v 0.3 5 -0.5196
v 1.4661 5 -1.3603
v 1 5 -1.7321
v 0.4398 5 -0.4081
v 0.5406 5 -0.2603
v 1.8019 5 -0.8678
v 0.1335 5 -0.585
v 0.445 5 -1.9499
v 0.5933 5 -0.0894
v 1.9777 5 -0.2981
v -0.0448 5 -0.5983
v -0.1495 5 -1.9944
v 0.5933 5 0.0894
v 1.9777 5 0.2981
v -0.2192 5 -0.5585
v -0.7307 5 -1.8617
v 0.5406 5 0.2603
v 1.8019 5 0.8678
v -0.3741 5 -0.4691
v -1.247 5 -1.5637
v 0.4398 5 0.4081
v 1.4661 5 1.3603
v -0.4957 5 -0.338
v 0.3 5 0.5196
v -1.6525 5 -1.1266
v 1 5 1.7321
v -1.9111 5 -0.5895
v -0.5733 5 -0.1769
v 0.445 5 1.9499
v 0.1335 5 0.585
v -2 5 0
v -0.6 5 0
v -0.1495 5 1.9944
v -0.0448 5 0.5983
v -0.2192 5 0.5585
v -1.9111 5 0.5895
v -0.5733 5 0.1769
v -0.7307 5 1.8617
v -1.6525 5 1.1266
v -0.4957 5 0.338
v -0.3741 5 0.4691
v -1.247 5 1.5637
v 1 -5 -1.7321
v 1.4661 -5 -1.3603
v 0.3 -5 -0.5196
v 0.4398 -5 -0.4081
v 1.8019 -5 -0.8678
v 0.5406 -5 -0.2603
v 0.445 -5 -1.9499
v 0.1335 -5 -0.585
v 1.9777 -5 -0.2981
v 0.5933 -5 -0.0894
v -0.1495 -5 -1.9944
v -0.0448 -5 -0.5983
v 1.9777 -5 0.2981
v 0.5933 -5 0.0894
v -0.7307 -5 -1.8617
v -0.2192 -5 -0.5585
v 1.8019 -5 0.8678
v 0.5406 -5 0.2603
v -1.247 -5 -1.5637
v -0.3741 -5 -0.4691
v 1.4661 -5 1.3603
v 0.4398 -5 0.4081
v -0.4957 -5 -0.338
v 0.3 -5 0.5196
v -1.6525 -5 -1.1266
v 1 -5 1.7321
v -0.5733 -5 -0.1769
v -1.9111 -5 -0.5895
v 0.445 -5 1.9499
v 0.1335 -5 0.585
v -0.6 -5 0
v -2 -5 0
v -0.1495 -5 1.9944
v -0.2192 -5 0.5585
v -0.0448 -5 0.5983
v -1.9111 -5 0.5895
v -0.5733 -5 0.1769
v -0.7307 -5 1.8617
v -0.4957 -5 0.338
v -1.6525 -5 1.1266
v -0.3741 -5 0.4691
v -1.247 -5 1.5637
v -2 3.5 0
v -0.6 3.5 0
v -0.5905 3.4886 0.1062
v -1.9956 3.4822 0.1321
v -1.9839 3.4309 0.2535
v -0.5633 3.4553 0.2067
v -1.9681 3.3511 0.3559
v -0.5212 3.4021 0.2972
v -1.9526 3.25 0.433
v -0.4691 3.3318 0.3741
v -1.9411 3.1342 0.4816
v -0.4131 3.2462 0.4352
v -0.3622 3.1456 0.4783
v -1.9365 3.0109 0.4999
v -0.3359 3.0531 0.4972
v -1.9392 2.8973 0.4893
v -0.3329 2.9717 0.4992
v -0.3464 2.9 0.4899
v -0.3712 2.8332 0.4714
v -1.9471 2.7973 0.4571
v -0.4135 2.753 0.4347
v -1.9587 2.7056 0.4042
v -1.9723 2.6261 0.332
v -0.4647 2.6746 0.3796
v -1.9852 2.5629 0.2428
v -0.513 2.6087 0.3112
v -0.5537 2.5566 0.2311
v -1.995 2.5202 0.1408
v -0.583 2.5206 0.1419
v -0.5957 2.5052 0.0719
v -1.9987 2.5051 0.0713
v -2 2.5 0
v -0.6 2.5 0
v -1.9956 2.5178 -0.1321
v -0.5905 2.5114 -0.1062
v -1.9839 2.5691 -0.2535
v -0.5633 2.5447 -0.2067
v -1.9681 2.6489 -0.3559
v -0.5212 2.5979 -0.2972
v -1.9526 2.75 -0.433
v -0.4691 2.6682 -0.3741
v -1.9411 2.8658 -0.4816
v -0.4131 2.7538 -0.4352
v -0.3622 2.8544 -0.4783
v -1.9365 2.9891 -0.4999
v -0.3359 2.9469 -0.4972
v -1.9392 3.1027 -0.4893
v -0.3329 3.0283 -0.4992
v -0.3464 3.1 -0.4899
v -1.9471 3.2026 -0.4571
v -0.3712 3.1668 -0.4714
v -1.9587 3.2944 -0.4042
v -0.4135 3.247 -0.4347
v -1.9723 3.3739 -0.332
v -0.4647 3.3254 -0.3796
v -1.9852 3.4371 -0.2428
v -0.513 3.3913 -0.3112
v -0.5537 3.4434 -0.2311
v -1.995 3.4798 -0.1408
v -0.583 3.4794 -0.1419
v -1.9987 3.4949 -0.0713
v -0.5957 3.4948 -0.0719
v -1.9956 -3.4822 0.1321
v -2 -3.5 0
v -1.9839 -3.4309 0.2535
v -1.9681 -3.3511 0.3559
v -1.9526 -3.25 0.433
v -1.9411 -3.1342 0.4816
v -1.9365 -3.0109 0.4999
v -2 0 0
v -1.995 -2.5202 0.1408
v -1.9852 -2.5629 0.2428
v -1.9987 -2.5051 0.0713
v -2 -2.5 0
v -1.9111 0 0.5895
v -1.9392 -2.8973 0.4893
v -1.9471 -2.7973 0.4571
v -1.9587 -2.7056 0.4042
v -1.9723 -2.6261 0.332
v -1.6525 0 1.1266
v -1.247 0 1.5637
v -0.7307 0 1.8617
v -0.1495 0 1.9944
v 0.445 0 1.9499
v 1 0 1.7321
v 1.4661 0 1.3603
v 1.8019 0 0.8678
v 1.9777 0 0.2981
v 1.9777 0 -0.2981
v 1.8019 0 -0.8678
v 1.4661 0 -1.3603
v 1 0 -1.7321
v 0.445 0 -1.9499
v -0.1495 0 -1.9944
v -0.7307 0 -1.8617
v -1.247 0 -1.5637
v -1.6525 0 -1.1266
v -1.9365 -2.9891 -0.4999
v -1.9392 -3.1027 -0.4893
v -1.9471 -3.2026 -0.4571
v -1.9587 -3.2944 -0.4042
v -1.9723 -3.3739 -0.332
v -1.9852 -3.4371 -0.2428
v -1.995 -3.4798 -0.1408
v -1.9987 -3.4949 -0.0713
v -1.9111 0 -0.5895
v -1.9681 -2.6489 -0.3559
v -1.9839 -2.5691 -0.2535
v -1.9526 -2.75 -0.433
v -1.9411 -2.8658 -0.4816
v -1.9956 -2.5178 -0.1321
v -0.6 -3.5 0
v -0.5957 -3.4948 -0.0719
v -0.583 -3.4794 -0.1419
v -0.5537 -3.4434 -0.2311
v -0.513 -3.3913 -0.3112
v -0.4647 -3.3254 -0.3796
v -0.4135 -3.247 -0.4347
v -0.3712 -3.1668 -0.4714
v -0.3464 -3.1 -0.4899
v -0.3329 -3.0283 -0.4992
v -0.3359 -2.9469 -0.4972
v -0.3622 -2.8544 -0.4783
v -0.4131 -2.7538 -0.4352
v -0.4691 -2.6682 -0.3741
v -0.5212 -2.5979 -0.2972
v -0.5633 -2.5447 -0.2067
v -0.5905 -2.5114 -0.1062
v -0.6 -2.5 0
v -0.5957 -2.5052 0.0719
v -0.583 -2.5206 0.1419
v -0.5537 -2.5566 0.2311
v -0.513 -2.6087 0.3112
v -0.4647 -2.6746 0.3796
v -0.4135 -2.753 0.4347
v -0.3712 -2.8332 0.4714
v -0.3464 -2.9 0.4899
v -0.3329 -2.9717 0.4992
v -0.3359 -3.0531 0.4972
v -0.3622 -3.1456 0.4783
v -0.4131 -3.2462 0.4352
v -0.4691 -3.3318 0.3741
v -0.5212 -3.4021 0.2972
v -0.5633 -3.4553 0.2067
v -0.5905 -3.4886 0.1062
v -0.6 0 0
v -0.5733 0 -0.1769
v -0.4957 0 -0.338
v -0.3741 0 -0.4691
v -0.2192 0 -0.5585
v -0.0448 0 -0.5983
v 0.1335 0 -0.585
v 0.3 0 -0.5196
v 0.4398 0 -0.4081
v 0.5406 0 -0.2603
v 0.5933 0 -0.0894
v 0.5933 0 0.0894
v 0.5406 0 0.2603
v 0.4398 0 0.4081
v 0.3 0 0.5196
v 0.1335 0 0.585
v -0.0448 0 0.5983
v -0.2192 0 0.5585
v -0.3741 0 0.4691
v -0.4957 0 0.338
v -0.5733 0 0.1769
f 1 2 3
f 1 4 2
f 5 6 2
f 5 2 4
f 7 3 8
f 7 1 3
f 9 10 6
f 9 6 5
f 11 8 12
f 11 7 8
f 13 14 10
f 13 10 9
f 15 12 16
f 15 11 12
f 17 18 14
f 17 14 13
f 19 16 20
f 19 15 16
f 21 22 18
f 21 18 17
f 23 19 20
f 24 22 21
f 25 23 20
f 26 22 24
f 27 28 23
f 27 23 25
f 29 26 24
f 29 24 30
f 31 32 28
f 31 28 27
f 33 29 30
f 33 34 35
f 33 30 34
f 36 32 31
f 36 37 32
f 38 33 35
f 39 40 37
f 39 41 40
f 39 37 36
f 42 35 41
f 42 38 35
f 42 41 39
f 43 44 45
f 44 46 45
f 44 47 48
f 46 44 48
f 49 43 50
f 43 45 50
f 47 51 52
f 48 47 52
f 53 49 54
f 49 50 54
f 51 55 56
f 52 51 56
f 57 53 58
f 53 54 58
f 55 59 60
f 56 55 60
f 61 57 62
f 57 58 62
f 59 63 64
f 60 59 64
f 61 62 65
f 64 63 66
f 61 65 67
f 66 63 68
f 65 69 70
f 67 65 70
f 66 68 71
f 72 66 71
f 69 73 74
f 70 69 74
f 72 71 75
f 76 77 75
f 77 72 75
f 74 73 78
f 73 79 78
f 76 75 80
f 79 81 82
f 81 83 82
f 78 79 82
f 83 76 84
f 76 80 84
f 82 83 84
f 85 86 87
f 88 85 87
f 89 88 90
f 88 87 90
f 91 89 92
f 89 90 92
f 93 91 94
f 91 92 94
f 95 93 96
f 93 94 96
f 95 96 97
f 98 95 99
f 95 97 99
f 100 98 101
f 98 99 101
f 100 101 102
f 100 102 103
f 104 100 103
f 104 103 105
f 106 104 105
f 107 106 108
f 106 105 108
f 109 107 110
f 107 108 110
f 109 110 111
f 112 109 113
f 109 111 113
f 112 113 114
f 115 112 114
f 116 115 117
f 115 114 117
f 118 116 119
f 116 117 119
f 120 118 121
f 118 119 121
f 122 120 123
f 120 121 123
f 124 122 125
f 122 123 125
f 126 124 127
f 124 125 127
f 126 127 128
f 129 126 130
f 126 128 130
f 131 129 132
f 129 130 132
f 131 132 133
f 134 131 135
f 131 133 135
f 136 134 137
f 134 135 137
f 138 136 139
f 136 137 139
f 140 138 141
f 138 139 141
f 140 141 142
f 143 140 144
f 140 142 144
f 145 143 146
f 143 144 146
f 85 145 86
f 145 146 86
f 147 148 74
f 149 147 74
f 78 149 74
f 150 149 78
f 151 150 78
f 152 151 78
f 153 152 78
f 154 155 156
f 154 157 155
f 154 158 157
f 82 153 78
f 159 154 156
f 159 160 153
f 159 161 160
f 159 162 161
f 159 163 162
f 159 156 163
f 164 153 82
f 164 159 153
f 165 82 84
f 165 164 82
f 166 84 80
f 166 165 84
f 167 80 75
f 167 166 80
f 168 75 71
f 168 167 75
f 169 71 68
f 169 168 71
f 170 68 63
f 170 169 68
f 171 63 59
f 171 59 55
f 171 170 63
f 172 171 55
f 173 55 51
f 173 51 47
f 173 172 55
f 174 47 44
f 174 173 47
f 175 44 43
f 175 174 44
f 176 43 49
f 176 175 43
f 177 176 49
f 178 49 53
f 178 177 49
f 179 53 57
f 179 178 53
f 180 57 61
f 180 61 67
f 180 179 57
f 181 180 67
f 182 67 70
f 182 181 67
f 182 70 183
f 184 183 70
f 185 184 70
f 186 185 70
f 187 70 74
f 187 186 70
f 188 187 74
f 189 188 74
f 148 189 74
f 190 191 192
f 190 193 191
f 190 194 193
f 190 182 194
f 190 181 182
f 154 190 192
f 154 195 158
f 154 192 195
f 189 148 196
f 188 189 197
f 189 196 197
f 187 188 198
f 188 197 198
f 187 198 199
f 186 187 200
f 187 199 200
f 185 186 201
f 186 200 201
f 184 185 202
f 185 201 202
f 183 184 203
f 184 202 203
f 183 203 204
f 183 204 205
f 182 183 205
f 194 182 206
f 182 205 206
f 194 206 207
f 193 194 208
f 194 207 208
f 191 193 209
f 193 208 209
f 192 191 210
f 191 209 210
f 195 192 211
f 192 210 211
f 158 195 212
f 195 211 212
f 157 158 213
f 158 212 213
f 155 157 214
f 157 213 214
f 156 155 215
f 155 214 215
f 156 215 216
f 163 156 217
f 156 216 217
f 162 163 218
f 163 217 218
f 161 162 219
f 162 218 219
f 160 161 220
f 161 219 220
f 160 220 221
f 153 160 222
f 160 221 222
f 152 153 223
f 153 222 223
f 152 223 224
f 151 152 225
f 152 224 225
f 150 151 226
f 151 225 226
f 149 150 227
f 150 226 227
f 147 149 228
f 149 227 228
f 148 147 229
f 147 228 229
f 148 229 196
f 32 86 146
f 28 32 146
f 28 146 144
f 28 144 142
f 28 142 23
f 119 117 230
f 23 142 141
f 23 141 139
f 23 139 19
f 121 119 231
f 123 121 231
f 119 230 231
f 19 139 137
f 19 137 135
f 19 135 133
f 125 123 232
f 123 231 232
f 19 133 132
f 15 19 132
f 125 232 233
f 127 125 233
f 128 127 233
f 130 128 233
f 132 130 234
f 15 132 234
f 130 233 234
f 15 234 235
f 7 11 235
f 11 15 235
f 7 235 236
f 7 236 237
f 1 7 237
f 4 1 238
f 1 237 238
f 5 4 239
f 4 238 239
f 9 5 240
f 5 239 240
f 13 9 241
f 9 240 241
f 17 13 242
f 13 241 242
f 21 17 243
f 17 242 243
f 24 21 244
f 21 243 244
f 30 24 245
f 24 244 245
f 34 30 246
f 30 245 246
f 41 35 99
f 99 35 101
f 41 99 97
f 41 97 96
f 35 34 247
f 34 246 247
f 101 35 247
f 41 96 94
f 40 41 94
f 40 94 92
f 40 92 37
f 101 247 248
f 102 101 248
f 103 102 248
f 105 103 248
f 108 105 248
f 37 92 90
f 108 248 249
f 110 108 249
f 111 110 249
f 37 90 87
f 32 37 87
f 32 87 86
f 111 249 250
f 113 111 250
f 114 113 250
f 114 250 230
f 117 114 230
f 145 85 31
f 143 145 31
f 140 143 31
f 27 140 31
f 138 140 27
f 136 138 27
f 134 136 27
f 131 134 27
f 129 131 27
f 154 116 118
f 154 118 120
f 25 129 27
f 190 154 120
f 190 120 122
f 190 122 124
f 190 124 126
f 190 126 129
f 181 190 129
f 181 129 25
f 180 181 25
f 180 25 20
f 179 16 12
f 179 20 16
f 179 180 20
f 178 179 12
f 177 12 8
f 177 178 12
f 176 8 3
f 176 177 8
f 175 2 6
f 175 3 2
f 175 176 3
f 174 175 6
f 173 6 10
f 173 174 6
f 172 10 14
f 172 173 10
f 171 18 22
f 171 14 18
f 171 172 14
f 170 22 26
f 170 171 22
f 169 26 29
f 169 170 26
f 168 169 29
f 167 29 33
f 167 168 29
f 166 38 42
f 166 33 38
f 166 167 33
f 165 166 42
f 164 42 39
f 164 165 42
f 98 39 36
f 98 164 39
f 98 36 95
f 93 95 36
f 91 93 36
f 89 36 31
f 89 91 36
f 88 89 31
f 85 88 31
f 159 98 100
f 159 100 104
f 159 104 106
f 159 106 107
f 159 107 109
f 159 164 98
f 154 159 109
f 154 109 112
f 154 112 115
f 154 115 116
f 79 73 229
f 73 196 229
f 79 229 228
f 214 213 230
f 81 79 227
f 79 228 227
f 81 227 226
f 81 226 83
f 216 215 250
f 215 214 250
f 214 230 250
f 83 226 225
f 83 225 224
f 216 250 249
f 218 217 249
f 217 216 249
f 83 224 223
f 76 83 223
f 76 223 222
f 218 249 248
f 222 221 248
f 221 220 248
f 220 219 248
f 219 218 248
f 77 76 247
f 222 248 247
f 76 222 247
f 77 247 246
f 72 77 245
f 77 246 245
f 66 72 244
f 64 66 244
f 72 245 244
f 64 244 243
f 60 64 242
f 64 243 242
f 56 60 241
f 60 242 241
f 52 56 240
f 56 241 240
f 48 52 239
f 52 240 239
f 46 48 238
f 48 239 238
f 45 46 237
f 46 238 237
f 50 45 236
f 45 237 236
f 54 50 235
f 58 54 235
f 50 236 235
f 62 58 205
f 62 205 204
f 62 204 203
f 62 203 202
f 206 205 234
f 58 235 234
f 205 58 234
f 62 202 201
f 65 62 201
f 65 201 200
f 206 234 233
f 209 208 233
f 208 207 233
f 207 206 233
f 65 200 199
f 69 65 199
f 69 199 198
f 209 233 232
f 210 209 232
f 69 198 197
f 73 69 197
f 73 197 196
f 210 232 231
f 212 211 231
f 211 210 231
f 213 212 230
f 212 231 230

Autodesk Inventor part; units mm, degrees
ref_plane "YZ Plane" through (0, 0, 0) normal (1, 0, 0) x (0, 1, 0)
ref_plane "XZ Plane" through (0, 0, 0) normal (0, 1, 0) x (-1, 0, 0)
ref_plane "XY Plane" through (0, 0, 0) normal (0, 0, 1) x (1, 0, 0)
sketch "Sketch1" plane through (0, 0, 0) normal (0, 1, 0) x (-1, 0, 0)
  circle A0 centre (0, 0) radius 0.6
  circle A1 centre (0, 0) radius 2
  dimension "d0" = 4
  dimension "d1" = 1.2
extrude "Extrusion1" add sketch "Sketch1" along normal mid plane 10
sketch "Sketch2" plane through (0, 0, 0) normal (1, 0, 0) x (0, 1, 0)
  circle A0 centre (3, 0) radius 0.5
  point P0 (0, 0)
  dimension "d4" = 3
  dimension "d5" = 1
extrude "Extrusion2" cut sketch "Sketch2" against normal through all
mirror "Mirror1" about plane through (0, 0, 0) normal (0, 1, 0) of "Extrusion2"
properties part number "wire_connector" material "Stainless Steel"
